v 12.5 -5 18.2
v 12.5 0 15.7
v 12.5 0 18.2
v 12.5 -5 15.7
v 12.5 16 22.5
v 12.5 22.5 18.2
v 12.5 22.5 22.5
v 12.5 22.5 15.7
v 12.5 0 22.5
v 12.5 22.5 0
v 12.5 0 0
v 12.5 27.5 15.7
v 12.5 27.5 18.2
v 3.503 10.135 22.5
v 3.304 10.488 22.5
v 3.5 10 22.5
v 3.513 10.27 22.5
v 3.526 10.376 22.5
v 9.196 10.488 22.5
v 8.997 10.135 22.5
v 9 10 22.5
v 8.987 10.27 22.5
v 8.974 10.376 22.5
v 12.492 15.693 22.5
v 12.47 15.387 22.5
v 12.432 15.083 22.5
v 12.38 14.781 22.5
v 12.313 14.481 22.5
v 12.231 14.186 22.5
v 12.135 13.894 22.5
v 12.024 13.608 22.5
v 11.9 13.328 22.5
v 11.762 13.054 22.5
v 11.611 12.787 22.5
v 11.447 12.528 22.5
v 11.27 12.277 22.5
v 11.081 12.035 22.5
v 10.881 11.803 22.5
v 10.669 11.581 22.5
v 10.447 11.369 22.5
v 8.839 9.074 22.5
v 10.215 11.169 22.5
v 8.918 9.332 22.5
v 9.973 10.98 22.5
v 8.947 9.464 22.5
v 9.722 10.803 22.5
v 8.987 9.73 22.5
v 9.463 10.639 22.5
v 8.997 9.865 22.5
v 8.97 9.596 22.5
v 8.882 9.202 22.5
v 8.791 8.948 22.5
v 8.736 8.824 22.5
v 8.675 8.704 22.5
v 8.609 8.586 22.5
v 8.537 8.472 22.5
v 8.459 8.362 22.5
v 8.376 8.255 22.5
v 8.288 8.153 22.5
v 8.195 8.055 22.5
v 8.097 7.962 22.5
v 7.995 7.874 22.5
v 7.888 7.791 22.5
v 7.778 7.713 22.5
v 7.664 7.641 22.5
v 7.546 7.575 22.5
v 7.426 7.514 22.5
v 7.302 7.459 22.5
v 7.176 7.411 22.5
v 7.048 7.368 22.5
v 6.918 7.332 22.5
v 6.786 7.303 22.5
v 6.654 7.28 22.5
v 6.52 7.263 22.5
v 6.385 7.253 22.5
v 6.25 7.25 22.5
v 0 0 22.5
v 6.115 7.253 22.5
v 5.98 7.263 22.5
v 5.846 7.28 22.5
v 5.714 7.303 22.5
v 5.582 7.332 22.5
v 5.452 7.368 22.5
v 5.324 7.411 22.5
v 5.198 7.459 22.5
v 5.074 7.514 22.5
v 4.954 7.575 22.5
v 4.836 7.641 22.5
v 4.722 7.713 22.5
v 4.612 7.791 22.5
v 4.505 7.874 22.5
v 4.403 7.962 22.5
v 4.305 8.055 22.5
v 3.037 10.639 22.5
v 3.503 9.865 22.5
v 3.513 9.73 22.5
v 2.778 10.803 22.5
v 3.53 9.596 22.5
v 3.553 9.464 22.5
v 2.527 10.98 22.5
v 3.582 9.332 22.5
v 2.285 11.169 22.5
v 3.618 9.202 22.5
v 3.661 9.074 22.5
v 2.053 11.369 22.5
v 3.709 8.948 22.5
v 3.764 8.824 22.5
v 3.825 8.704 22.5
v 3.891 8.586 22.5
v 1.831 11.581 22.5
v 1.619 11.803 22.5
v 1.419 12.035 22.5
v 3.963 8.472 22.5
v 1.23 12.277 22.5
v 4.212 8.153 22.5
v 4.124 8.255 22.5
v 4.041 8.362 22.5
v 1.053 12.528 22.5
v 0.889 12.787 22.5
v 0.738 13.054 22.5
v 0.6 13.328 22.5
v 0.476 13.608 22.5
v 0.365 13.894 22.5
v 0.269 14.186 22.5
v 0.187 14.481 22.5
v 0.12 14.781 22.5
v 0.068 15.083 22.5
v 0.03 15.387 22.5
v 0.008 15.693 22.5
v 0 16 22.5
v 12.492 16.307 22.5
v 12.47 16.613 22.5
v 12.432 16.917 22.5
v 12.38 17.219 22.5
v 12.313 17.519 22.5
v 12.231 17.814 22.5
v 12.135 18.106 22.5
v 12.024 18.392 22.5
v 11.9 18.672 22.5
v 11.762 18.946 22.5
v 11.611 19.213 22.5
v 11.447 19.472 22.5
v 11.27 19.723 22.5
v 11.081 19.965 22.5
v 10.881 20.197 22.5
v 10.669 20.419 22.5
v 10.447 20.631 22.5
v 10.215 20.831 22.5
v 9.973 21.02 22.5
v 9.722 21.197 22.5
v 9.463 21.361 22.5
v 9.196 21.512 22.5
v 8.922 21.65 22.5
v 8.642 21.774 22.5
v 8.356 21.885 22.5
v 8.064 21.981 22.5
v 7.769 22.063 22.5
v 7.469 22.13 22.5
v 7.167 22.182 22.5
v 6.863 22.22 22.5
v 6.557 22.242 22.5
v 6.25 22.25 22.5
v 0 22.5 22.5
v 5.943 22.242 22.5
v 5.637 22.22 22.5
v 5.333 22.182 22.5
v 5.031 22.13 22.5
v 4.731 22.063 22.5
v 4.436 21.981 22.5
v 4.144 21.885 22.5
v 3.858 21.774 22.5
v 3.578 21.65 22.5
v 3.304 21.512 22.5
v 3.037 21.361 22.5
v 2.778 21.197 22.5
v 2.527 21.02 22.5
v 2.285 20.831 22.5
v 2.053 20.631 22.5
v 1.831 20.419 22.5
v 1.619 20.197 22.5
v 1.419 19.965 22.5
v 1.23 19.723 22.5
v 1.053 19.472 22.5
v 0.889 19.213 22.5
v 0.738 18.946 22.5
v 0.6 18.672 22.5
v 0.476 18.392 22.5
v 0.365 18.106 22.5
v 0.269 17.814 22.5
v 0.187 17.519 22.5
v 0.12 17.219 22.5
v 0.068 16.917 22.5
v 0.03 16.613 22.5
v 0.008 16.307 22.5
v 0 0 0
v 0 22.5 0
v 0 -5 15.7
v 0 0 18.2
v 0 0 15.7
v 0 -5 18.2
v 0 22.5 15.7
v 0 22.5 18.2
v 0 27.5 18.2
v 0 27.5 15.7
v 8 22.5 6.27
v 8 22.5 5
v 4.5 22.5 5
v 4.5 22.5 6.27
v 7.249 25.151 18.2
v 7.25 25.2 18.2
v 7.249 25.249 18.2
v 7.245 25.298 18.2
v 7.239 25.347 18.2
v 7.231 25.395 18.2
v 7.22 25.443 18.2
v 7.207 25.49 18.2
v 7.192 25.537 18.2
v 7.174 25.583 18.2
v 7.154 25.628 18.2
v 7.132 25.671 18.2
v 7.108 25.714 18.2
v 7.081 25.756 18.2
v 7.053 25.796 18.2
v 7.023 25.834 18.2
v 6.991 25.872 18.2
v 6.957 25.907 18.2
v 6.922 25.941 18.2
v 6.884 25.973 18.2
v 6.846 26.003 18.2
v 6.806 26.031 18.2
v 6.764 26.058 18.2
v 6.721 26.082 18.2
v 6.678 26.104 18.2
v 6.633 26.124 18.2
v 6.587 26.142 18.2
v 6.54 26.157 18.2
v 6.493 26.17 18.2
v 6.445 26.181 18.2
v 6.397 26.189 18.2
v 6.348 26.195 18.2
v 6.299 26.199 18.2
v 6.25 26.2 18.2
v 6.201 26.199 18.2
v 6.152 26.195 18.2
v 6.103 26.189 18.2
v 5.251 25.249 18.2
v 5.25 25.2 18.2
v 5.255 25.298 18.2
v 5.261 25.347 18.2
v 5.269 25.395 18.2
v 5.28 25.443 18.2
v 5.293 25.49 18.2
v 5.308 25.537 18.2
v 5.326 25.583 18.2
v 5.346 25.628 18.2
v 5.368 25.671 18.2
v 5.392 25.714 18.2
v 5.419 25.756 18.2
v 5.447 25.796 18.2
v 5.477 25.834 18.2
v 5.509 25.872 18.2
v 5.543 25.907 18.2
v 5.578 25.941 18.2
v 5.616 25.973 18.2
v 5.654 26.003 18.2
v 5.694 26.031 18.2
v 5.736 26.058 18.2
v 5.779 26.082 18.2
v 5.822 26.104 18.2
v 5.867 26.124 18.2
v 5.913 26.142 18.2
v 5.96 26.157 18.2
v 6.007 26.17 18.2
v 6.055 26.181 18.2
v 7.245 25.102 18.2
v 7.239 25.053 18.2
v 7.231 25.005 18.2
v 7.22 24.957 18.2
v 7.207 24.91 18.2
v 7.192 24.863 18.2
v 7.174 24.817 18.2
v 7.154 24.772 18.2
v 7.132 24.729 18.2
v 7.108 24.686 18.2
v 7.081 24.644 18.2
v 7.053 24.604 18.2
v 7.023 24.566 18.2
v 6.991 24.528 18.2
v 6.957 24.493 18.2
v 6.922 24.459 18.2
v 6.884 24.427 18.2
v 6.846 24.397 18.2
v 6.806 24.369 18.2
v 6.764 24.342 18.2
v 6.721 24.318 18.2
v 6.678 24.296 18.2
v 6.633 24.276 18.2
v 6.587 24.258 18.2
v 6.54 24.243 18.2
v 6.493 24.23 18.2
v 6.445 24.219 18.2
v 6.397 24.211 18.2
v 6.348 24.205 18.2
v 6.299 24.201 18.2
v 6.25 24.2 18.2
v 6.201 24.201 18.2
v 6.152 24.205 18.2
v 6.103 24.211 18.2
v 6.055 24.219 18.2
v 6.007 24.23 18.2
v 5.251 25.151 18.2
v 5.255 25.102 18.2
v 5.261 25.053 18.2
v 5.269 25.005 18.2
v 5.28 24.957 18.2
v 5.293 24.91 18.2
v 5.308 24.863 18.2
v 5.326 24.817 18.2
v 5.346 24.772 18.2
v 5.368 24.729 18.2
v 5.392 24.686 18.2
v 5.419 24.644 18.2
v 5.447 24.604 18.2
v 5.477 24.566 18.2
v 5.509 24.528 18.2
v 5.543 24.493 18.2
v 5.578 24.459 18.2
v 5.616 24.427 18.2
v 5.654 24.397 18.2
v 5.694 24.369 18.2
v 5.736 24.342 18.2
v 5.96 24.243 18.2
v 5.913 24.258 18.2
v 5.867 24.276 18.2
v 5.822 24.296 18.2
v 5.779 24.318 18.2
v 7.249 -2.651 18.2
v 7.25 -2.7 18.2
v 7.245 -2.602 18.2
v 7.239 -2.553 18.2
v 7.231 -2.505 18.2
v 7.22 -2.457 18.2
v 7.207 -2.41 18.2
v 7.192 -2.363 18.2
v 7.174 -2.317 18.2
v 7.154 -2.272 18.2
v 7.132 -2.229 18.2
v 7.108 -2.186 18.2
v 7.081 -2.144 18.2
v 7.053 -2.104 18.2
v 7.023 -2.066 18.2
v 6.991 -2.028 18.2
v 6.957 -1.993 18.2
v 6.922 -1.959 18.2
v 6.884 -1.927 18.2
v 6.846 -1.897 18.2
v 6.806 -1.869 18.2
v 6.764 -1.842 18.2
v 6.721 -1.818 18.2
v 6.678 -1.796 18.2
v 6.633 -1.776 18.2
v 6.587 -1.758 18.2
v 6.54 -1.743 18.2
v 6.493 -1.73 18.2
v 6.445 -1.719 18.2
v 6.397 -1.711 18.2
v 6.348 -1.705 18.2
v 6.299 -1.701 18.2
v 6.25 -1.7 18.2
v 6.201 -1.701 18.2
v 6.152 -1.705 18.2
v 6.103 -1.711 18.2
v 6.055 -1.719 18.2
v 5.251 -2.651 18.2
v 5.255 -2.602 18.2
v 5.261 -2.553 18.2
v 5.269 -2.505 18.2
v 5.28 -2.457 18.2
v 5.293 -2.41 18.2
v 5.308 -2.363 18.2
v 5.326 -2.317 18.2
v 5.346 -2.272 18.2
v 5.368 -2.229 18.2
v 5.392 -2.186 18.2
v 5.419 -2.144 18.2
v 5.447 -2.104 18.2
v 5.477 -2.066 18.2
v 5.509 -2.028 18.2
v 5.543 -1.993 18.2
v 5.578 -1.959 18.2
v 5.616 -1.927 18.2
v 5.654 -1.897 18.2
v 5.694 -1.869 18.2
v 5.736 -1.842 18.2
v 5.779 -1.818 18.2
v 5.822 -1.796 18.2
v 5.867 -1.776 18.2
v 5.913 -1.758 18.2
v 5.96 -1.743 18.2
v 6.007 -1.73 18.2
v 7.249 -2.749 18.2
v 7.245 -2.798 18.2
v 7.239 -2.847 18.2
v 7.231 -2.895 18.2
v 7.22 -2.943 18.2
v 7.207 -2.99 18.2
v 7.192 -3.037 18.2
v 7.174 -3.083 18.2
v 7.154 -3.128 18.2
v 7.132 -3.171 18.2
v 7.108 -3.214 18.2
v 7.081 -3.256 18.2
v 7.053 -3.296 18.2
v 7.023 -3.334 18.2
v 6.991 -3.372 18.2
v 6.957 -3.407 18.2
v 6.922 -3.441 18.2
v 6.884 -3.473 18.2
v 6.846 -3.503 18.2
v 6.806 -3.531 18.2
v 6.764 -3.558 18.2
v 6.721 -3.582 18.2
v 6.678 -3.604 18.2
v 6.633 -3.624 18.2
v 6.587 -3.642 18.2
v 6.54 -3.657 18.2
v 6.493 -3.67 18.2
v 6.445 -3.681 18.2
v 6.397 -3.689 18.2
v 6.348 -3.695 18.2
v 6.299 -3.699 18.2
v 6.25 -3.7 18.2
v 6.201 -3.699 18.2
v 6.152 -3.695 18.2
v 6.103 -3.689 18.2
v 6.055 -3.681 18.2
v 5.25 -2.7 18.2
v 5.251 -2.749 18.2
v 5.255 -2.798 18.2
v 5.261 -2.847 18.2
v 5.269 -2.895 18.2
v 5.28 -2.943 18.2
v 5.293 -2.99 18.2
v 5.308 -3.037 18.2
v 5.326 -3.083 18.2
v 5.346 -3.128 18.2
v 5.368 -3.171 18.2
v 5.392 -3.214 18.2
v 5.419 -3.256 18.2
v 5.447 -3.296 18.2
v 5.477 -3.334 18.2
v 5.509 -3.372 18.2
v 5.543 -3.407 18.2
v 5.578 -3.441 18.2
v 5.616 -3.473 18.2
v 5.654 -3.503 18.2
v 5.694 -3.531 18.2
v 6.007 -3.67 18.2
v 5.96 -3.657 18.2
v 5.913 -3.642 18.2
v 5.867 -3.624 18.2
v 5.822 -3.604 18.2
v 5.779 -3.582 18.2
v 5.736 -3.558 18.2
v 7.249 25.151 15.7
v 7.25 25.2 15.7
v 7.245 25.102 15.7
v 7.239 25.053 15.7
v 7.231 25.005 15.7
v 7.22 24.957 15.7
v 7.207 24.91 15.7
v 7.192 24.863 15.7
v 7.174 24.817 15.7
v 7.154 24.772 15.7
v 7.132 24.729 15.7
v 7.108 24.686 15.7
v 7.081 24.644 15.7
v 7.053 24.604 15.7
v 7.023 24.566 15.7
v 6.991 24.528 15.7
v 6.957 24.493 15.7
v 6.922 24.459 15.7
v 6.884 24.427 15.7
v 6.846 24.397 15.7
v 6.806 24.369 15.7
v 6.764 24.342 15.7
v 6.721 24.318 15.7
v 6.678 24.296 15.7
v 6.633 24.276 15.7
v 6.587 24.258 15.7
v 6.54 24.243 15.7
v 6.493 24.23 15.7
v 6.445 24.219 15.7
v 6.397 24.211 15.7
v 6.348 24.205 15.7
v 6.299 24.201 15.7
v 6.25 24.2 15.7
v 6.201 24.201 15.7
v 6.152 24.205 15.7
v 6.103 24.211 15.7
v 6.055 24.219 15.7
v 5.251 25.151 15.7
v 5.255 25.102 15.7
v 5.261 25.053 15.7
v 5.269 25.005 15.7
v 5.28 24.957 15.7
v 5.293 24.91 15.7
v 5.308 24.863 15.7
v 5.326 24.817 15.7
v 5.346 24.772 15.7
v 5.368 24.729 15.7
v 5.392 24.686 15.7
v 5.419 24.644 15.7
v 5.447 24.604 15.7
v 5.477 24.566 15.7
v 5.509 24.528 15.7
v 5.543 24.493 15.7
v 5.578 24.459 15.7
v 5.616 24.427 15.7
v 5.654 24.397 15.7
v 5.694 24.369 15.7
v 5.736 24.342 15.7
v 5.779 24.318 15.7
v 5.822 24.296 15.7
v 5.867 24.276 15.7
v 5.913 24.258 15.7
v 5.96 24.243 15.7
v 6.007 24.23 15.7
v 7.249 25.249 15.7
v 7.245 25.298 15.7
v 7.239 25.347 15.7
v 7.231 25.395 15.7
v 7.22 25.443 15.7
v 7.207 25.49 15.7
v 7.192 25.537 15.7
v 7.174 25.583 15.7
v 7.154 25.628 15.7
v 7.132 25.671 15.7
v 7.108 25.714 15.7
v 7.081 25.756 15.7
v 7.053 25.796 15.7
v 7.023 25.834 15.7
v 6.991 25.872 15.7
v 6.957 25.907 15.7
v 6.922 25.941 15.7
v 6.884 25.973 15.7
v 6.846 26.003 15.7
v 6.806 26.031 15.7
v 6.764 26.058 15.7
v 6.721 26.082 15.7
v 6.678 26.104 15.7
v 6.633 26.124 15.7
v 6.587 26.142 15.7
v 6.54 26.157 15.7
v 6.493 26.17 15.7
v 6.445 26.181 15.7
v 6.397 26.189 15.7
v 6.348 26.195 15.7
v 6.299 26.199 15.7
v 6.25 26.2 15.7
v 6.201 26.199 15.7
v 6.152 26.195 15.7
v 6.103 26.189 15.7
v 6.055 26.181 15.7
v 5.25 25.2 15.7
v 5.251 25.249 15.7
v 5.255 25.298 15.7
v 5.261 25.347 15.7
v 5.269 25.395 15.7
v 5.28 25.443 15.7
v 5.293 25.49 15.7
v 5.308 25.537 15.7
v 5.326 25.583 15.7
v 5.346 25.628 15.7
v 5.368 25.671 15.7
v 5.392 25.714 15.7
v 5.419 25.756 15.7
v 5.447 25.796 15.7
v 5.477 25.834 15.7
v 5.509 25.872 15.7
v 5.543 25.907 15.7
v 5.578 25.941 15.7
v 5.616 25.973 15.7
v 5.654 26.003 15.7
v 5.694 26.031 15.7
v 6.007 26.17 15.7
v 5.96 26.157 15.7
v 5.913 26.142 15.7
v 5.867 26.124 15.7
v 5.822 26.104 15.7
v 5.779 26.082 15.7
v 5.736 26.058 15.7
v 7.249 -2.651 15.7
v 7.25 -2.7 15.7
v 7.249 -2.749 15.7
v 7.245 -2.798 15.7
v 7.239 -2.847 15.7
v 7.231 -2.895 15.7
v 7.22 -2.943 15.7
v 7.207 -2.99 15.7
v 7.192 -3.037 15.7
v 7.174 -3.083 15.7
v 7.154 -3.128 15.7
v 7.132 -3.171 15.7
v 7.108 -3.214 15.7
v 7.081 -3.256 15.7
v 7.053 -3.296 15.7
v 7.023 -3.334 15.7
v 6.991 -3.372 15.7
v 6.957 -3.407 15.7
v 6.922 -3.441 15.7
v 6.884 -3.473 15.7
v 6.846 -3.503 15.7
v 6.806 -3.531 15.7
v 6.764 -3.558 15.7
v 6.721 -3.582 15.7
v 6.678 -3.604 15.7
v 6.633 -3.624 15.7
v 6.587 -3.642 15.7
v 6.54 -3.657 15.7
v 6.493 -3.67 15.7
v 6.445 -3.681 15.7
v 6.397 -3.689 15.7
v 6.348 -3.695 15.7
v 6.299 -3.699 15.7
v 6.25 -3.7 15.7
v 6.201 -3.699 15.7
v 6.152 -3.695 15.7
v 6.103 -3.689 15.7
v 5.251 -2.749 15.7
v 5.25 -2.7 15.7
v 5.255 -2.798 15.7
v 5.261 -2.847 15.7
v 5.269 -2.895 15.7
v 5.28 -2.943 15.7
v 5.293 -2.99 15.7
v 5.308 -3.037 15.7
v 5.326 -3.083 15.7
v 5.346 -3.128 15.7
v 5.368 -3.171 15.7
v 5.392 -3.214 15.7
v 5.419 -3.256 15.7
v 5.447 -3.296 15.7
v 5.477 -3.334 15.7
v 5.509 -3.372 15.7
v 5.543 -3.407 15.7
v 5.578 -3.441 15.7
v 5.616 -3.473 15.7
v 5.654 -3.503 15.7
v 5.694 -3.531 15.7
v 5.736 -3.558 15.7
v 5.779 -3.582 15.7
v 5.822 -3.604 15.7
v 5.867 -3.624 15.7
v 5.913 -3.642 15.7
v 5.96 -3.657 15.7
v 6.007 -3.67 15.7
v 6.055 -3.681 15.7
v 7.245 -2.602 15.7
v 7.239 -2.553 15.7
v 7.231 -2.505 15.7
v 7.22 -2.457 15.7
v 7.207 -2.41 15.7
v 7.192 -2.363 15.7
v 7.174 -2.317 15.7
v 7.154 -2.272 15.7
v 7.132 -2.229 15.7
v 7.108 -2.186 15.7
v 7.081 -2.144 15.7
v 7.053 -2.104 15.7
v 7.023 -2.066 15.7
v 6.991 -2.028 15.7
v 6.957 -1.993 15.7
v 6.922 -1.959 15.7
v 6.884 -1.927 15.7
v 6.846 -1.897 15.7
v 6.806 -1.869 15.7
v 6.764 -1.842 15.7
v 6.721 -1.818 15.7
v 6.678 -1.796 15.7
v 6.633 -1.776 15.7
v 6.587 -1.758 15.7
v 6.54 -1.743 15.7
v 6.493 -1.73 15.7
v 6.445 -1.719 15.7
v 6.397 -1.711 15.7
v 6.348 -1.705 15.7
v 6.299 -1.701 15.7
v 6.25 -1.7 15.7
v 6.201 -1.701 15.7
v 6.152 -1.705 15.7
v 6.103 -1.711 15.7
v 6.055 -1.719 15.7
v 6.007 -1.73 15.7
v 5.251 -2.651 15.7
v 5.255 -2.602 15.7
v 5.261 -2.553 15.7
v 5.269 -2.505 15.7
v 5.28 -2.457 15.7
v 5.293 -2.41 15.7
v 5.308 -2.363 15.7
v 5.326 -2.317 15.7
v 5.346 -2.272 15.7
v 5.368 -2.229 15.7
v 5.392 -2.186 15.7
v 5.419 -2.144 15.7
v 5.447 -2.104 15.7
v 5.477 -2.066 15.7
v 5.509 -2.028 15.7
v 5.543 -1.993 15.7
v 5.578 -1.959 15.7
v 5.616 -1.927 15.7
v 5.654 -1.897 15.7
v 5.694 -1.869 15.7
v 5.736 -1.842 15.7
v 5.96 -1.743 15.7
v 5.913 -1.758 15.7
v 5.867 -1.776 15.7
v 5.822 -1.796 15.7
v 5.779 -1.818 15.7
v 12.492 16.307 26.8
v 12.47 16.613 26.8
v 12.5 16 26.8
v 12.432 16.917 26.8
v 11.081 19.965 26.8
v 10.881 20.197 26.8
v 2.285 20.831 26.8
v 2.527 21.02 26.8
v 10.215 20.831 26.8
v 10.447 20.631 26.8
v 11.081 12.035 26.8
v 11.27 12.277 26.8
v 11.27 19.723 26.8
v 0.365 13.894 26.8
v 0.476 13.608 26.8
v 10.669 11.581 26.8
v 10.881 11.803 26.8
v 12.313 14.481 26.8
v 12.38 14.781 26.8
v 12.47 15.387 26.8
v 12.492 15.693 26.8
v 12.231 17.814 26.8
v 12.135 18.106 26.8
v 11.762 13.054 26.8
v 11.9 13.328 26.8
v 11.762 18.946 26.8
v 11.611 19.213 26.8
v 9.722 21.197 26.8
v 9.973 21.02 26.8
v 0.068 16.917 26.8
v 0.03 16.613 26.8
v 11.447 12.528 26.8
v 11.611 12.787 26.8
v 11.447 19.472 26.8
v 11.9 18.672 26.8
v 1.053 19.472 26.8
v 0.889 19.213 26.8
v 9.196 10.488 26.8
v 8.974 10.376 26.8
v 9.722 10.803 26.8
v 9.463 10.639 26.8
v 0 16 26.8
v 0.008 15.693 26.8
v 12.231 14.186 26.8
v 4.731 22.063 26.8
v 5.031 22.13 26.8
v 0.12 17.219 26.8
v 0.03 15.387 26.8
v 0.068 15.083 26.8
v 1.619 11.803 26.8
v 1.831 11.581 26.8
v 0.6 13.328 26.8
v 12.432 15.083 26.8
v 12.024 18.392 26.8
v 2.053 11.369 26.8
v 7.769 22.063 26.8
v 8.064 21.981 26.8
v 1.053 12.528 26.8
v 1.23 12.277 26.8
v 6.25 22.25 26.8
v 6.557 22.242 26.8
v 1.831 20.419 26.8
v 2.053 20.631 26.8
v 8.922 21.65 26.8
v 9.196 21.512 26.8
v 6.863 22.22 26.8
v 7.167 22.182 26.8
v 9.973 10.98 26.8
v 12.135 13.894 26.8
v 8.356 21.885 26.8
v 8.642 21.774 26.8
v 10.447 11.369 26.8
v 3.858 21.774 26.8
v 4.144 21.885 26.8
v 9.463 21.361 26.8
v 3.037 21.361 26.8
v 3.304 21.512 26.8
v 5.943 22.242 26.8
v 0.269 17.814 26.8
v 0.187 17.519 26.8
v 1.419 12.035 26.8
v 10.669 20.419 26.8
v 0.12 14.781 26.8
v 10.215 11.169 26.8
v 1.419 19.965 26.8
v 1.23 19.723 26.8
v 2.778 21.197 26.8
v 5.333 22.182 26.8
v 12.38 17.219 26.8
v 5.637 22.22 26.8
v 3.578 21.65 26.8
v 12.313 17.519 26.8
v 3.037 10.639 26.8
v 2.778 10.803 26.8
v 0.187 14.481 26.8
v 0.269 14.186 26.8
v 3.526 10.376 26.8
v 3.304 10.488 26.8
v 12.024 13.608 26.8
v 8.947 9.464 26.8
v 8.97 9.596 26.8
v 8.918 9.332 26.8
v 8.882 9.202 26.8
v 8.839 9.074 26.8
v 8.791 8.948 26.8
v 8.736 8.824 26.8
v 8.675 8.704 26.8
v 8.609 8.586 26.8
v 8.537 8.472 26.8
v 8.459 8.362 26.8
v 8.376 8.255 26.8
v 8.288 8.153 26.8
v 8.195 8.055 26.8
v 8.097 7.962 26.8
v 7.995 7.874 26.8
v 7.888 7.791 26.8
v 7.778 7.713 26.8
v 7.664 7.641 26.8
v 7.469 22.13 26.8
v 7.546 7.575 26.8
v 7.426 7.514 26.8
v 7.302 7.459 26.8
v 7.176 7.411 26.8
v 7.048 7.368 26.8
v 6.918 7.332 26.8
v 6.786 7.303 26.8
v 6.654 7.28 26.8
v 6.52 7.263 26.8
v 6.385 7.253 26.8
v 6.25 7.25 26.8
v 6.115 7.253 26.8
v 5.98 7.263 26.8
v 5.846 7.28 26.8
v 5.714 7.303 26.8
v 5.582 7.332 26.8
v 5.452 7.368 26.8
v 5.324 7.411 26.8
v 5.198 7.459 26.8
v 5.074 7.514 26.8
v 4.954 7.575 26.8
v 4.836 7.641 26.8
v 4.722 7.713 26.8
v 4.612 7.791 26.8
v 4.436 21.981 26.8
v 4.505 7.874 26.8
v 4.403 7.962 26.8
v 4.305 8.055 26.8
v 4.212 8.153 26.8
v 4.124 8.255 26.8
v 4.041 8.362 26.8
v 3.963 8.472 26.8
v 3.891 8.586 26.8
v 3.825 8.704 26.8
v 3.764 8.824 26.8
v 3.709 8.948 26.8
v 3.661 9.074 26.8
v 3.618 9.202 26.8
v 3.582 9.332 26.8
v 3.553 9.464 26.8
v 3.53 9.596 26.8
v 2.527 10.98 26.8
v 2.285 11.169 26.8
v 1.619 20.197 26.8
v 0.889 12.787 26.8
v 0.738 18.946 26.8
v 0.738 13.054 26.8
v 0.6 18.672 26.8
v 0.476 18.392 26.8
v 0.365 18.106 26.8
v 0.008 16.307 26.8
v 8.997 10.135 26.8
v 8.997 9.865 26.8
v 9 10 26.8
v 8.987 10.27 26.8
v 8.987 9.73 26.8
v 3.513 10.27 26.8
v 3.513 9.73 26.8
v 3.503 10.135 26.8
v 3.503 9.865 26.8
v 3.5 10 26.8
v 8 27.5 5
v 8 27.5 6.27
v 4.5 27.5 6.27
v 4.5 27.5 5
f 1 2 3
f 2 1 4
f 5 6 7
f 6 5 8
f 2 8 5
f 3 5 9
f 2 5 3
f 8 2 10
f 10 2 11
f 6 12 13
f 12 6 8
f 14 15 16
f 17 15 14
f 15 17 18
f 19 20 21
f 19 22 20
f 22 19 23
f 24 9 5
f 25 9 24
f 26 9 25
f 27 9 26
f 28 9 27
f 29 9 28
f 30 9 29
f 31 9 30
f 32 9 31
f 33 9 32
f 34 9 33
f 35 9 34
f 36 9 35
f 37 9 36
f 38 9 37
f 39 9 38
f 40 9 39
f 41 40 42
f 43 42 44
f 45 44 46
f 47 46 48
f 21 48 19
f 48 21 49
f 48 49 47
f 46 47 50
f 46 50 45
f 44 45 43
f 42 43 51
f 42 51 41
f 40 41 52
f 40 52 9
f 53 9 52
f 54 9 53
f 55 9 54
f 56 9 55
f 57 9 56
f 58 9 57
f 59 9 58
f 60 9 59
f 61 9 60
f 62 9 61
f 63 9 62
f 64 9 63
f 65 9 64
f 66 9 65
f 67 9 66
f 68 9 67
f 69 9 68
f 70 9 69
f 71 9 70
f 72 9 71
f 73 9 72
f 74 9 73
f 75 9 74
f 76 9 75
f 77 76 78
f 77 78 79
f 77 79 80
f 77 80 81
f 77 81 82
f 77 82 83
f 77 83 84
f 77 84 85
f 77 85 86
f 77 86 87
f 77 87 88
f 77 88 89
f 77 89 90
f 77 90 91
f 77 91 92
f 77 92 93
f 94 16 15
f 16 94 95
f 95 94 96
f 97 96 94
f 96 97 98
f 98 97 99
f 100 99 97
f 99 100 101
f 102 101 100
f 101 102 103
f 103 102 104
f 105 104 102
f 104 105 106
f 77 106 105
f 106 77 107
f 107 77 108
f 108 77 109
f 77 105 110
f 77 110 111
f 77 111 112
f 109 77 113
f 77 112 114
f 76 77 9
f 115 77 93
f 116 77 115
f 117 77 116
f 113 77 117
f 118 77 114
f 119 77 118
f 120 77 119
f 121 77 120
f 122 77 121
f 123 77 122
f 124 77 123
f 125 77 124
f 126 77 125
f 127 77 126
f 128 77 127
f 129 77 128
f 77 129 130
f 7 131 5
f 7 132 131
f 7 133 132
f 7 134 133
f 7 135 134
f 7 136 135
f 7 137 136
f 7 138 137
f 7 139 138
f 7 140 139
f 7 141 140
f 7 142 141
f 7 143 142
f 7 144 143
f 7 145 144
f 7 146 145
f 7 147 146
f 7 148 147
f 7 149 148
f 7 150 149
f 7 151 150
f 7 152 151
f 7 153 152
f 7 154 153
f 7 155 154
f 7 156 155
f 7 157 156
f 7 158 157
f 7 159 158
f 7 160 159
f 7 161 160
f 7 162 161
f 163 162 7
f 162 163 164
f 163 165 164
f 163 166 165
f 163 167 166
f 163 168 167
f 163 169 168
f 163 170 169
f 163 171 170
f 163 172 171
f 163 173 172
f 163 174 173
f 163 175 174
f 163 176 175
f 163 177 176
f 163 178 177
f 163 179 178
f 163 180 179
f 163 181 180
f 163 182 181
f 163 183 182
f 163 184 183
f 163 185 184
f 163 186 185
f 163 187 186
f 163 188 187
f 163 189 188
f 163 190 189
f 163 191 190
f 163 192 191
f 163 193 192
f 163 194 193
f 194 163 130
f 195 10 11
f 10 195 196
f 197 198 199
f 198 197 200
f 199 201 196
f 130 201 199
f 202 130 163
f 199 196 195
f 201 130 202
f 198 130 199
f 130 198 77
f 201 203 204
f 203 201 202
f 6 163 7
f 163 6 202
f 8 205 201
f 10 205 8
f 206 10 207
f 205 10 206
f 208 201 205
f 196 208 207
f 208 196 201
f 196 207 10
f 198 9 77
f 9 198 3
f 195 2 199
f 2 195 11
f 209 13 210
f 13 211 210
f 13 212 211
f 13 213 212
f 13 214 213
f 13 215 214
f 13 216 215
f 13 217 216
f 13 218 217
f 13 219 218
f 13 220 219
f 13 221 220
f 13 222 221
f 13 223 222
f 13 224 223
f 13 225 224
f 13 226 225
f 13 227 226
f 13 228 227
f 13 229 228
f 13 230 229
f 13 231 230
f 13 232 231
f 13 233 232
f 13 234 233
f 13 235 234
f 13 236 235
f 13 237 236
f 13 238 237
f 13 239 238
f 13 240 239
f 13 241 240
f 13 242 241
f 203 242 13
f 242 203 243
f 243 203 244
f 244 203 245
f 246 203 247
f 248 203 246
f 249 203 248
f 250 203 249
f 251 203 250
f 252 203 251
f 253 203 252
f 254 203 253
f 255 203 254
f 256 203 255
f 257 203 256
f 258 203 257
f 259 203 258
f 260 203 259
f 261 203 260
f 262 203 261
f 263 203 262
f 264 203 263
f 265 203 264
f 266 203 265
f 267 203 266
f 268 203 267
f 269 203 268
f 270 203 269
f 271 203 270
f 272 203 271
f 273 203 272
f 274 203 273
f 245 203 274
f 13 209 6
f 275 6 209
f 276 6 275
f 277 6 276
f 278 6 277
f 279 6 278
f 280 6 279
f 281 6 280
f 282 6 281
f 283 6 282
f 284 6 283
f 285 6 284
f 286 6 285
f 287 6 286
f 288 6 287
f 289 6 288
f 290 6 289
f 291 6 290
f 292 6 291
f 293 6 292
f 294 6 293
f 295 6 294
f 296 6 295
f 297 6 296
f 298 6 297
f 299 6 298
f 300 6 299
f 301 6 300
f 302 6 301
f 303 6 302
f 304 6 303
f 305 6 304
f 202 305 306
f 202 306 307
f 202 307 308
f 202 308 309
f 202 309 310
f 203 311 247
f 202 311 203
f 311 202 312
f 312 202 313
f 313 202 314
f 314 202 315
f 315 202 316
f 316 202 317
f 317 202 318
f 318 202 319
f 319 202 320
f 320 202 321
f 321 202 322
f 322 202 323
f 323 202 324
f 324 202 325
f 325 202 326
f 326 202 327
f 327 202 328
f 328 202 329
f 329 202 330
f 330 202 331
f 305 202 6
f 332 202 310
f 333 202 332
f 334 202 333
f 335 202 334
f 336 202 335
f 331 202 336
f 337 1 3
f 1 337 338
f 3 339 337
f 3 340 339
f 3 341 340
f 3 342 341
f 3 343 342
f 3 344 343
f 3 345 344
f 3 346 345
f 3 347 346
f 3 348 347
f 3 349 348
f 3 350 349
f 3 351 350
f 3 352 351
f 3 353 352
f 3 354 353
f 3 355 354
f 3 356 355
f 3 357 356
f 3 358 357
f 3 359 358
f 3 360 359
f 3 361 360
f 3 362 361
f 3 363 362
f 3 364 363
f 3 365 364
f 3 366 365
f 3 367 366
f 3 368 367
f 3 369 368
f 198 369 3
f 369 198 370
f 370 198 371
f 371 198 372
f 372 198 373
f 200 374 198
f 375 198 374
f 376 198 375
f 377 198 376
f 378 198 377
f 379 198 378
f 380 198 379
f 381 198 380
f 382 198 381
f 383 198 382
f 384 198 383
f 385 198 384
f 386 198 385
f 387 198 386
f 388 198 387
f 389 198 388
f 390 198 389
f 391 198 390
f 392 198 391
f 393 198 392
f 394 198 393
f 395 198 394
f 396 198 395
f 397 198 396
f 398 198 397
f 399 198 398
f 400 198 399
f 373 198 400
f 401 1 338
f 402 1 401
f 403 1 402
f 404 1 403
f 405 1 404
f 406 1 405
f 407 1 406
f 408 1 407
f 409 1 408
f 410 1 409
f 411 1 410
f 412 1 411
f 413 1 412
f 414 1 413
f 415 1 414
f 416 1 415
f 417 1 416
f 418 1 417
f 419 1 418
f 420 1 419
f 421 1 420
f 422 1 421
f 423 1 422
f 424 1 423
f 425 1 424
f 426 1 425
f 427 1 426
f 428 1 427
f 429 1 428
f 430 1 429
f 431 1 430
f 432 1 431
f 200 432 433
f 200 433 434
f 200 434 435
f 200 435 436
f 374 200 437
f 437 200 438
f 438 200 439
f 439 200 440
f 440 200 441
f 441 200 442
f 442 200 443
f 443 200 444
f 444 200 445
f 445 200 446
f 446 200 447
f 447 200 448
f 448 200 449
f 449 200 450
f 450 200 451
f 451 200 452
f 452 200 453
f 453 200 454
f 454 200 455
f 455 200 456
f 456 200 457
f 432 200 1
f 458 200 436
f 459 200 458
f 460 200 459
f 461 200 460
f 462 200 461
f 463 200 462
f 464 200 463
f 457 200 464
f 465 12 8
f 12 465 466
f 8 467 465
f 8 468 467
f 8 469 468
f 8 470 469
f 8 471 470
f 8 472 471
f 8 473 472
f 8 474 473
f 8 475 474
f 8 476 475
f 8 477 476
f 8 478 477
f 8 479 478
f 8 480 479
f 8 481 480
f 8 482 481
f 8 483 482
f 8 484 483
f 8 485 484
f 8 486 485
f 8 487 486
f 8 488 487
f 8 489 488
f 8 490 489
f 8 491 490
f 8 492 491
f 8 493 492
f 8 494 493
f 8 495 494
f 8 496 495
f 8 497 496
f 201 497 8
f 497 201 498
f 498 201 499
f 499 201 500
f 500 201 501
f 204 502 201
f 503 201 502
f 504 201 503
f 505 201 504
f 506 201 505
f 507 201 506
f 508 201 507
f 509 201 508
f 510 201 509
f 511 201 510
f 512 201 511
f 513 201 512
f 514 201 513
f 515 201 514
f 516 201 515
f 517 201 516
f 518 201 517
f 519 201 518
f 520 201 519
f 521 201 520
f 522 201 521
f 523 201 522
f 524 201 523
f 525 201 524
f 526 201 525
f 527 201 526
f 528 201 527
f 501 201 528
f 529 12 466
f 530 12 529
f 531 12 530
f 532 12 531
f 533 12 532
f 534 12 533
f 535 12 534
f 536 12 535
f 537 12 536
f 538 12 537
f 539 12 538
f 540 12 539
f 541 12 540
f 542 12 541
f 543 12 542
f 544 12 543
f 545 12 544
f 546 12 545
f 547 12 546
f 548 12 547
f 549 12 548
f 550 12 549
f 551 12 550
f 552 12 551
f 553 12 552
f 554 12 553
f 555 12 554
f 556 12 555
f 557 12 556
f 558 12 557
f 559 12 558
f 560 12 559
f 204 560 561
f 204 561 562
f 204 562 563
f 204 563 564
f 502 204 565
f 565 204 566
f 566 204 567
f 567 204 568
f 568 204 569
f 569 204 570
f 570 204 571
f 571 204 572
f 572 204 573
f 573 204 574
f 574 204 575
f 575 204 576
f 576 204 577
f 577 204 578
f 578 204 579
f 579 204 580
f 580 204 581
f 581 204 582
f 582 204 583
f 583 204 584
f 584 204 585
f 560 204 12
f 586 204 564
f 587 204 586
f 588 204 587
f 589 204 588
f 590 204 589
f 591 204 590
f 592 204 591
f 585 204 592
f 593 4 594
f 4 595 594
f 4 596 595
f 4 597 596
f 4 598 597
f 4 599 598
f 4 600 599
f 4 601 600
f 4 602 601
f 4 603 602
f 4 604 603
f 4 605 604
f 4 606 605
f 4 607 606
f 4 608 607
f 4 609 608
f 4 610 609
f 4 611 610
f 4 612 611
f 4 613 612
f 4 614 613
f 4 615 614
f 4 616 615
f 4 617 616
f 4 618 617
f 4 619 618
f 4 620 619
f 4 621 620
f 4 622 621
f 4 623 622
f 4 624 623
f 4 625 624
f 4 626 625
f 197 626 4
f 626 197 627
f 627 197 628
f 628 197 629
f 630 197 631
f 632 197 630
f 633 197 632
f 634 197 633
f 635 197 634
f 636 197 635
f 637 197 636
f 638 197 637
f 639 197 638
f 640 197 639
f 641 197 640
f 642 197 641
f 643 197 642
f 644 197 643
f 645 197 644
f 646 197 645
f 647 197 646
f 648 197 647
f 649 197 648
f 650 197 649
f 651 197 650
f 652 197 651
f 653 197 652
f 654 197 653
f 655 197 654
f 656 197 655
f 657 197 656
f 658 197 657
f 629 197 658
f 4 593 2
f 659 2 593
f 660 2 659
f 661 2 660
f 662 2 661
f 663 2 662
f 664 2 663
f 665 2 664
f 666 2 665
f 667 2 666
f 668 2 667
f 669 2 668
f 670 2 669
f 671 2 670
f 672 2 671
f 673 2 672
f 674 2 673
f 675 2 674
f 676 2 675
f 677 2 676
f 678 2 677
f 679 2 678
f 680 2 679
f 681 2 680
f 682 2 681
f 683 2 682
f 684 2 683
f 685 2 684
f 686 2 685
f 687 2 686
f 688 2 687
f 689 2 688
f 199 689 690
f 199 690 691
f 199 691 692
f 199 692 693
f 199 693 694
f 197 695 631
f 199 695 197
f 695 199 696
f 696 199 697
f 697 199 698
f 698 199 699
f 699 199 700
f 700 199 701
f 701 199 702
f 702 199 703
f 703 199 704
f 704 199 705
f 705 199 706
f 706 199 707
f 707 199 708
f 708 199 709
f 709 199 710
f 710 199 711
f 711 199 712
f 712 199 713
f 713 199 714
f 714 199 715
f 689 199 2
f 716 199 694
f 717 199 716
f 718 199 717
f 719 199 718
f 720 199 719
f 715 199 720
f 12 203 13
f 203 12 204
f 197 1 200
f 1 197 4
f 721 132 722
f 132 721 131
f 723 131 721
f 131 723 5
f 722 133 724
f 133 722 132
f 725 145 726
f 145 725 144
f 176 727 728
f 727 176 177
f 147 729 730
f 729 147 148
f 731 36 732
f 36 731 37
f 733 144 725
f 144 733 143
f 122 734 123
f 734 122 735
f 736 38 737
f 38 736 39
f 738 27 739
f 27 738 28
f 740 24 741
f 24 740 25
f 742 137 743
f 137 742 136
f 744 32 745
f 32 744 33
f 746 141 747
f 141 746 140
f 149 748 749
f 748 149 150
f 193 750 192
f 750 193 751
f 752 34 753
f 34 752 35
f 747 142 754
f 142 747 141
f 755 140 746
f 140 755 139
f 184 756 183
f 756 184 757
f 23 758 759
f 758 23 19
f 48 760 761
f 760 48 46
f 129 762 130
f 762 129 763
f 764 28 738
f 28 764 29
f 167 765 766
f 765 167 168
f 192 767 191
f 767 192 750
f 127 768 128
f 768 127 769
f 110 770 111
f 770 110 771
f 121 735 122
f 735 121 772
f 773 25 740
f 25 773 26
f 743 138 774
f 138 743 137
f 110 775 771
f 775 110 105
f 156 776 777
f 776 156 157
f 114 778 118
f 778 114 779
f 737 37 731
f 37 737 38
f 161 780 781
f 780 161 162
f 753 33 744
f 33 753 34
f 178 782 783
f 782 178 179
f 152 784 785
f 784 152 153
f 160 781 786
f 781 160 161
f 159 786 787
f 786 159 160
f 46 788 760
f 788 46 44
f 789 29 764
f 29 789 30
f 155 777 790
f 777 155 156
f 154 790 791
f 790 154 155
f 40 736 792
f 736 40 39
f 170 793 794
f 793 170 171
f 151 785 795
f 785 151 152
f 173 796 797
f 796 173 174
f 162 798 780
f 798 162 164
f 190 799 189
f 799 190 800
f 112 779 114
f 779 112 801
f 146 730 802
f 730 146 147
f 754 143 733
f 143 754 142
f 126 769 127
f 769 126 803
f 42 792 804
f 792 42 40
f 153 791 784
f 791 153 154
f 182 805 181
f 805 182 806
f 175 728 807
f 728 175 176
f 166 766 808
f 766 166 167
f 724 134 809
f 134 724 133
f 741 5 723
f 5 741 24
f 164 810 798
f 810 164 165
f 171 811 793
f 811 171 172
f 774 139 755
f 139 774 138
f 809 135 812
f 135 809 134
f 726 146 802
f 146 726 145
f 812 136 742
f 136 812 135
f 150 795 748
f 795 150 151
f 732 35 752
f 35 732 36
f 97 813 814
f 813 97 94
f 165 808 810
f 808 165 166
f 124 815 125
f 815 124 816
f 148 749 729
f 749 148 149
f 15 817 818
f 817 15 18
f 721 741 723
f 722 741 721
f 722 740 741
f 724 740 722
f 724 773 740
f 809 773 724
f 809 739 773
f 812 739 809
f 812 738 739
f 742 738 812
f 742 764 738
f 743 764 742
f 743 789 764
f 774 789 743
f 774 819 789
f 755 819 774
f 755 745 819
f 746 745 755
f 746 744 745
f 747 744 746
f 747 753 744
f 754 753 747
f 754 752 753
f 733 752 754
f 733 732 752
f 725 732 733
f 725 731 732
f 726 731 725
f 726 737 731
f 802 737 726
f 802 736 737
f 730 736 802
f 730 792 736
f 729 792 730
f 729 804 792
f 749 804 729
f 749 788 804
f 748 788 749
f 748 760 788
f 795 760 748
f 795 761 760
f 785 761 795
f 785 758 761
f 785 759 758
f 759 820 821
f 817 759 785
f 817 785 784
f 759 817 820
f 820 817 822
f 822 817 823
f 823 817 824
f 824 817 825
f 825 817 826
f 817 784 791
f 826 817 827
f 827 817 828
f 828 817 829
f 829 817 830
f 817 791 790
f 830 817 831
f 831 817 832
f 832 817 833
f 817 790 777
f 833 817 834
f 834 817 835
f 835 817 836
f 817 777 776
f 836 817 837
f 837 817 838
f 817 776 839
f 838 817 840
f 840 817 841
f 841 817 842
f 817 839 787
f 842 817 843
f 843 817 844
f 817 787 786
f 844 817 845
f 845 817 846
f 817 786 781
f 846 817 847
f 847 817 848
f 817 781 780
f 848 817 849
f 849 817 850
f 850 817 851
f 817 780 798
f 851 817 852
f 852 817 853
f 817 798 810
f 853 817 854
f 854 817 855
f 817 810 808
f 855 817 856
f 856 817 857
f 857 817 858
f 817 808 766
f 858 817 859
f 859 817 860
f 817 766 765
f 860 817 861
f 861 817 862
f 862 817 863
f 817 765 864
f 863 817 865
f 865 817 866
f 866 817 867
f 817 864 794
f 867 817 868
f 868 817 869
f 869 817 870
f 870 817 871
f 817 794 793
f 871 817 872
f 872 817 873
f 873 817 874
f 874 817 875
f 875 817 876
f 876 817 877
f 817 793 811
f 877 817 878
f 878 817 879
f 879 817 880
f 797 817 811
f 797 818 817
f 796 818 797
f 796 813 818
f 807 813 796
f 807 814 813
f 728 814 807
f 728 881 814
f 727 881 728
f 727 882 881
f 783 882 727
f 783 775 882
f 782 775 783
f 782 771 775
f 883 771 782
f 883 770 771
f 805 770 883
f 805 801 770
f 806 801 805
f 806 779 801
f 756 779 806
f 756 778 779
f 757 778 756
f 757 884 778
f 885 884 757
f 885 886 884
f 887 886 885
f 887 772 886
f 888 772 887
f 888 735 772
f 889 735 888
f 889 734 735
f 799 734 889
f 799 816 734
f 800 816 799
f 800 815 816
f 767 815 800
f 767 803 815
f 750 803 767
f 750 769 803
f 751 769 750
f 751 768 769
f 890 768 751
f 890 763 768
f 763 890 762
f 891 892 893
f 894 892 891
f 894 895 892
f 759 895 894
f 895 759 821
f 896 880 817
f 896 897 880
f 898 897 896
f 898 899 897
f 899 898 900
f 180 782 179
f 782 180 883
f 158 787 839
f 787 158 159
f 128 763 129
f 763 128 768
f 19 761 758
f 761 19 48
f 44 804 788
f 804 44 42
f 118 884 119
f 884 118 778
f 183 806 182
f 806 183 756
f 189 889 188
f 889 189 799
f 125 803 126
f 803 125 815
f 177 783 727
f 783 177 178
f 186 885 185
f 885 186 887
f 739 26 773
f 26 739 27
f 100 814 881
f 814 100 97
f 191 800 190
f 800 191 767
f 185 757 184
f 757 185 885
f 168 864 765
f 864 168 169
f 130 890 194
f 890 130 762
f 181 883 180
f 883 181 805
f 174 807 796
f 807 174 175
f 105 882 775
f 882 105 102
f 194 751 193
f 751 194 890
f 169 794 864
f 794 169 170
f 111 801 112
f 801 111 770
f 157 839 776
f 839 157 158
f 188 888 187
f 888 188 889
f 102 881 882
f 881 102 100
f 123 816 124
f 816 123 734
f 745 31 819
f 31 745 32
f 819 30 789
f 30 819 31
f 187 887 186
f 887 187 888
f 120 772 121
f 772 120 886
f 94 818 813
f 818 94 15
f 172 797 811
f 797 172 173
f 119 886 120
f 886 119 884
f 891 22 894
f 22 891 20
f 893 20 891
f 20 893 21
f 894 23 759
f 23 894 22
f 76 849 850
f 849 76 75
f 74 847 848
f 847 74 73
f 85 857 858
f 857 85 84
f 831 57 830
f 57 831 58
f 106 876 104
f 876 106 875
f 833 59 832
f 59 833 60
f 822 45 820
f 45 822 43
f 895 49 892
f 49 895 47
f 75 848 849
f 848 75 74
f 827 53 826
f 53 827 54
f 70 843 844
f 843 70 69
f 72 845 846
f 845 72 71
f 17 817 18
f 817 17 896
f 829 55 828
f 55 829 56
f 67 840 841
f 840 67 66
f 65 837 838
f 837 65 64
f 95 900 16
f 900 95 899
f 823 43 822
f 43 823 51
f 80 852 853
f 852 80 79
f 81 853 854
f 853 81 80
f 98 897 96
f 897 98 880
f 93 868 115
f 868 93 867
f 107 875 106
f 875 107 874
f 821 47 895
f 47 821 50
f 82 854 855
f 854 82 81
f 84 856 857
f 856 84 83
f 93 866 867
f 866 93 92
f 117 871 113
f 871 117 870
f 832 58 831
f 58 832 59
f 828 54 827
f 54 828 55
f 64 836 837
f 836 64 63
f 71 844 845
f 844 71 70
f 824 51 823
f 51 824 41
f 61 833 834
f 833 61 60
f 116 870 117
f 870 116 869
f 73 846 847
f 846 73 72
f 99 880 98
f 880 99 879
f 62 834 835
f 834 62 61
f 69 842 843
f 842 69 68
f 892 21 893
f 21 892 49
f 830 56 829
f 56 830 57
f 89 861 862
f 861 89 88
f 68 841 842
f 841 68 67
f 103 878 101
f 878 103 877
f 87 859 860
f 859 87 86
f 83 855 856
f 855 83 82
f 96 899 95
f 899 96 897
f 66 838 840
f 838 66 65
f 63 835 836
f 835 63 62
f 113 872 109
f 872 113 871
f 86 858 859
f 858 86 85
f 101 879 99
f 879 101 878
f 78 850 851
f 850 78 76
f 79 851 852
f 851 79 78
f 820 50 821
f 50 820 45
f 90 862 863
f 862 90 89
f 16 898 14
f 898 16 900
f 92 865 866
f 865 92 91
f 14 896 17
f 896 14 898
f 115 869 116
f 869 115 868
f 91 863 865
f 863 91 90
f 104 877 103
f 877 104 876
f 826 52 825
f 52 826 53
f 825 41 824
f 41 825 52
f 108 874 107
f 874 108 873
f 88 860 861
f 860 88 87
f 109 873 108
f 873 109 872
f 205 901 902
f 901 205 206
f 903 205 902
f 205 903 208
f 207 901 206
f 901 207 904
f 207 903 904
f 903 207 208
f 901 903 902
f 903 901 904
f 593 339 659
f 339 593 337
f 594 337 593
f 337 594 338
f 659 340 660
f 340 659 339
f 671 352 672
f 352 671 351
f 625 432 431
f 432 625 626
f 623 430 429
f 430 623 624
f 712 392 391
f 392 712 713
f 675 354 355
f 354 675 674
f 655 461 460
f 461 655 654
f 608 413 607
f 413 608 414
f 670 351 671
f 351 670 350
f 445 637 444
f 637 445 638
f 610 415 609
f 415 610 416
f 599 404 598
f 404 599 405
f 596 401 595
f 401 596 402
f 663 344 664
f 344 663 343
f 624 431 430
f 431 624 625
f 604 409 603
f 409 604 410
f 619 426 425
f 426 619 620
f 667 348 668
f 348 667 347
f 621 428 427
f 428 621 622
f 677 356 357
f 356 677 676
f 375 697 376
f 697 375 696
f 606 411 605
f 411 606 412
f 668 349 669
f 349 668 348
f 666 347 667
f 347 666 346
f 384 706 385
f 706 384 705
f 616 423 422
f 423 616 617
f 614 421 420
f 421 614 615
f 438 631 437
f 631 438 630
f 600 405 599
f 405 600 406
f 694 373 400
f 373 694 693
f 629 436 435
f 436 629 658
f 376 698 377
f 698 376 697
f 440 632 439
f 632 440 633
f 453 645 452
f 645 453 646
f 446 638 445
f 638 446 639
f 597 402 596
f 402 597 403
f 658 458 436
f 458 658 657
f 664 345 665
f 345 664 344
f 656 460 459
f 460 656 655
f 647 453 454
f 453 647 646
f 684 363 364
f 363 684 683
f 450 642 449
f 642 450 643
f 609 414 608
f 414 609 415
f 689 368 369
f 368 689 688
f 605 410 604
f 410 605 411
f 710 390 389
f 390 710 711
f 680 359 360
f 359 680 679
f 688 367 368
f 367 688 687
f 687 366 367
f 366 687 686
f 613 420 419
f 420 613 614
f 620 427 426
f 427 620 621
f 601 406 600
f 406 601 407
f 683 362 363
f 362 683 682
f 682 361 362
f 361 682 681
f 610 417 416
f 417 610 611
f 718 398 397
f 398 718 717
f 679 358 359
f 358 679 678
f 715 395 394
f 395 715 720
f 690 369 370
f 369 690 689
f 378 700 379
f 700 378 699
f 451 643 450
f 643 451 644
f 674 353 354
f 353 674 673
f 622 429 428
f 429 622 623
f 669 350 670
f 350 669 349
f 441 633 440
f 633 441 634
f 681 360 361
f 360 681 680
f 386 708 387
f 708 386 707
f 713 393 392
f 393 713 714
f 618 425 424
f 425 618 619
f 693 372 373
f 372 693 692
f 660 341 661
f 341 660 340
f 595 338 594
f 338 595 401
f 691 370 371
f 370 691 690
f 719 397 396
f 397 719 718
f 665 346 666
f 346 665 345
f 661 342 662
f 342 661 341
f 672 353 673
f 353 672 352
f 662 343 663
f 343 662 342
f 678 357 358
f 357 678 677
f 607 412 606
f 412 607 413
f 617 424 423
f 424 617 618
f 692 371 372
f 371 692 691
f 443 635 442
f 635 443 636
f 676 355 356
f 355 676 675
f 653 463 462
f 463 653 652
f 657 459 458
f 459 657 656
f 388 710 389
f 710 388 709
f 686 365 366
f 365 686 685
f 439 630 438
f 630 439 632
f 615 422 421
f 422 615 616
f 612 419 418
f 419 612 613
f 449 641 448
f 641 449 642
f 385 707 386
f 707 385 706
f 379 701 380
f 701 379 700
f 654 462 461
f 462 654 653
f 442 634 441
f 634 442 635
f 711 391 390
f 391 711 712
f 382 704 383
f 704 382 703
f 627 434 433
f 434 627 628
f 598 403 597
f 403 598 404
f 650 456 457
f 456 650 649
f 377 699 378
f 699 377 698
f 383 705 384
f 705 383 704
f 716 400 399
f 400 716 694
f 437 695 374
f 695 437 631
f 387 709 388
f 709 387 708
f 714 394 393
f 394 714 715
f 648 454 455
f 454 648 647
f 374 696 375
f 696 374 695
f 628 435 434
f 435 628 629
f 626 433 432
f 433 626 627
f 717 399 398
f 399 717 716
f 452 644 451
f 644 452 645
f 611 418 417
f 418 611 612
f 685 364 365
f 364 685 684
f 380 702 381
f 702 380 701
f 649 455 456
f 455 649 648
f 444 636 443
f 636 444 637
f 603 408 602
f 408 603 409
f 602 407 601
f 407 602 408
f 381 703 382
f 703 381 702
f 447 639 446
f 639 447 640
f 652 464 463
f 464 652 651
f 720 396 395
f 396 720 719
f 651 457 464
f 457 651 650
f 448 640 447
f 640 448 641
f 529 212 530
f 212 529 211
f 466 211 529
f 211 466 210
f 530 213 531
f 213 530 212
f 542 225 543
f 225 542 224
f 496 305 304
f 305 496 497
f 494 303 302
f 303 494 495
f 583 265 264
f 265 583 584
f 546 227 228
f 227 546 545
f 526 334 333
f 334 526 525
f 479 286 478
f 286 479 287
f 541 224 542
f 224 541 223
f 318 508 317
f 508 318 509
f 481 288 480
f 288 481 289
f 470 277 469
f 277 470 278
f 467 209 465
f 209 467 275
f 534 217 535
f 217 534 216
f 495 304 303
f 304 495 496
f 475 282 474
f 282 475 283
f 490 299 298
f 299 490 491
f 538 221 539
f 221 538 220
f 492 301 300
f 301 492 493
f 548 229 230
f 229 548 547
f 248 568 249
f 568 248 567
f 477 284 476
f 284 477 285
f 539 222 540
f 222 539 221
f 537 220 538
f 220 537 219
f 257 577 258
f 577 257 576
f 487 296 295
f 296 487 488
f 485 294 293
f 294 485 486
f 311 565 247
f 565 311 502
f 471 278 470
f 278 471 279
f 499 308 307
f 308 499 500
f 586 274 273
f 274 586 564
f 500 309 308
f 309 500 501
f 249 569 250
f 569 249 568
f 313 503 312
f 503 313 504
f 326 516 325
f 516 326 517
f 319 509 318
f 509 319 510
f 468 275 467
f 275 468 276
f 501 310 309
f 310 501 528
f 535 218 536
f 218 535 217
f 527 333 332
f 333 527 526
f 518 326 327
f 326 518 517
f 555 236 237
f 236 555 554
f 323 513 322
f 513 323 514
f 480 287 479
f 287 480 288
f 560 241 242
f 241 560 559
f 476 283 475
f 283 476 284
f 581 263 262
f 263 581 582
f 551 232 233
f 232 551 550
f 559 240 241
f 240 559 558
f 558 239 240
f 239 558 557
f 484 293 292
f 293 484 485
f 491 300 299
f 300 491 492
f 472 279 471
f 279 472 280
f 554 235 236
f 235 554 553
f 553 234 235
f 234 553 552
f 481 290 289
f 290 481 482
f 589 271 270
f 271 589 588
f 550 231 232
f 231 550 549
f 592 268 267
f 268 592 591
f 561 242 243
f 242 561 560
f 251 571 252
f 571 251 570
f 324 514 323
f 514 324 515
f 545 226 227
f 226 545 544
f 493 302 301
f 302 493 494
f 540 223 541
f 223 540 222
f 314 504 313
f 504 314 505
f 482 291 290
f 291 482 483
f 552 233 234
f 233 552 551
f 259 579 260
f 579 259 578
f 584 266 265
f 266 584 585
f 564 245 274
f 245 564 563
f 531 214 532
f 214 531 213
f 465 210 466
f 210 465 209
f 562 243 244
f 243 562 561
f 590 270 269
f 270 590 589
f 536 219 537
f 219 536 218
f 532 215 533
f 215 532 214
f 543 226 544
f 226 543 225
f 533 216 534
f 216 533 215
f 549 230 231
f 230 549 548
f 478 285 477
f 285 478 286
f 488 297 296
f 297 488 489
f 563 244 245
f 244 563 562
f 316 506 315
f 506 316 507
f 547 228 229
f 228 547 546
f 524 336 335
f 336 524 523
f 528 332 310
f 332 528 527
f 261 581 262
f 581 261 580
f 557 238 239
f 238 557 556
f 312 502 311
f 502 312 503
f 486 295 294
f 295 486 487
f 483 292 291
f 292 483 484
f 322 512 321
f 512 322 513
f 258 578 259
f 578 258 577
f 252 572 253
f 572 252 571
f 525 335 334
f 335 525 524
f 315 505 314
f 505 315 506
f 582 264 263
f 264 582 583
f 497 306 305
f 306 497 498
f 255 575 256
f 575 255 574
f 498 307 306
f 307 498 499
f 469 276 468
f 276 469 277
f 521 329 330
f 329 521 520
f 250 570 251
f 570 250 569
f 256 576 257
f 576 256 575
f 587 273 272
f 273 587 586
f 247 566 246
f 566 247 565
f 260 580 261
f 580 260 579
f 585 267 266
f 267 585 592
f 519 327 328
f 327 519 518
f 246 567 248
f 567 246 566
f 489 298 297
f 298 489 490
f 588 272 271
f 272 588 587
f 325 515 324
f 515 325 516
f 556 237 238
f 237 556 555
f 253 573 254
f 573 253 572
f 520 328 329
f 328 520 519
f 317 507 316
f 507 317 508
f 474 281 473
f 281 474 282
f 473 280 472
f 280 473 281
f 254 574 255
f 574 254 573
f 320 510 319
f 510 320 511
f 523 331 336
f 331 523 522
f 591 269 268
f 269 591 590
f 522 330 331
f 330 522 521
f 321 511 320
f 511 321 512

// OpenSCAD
// file: shortcuts.scad
//include </u/a/3dprint/alanlib/shortcuts.scad>;
//include <shortcuts.scad>  <- only works if run from terminal
module R(v) {rotate(v) children();}
module T(v) {translate(v) children();}
module S(v) {scale(v) children();}
module Rx(a=90) {rotate([a, 0, 0]) children();}
module Ry(a=90) {rotate([0, a, 0]) children();}
module Rz(a=90) {rotate([0, 0, a]) children();}
module Tx(d) {translate([d, 0, 0]) children();}
module Ty(d) {translate([0, d, 0]) children();}
module Tz(d) {translate([0, 0, d]) children();}
module Sx(s) {scale([s, 1, 1]) children();}
module Sy(s) {scale([1, s, 1]) children();}
module Sz(s) {scale([1, 1, s]) children();}

// TODO: rename this to utils.scad
// TODO: create shapes.scad, move stuff there

mm_per_in = 25.4;
eps = .001;
phi = (sqrt(5)+1)/2; // useful for regular solids
O = 0; // silly sugar for hiding syntax highlighting

module brim_scale(s = [0.9, 1.1], height=.3) {
    // to be used for objects with multiply-connected footprints - 
    // the minkowski method doesn't work well for that case
    //
    // designed to work for objects that :
    // - rest on the x-y plane
    // - are somewhat centered on the origin
    union() {
        children();
        linear_extrude(height=height)
        difference() {
            scale([s[1], s[1], s[0]]) hull() projection(cut=true) children();
            scale([s[0], s[0], s[1]]) hull() projection(cut=true) children();
        }
    }
}

module dremel_footprint() {
    difference() {
        cube([232, 152, 1], center=true);
        cube([230, 150, 2], center=true);
    }
}

module brim_minkowski(radius=10, height=.3) {
    // i think this produces the "right" result for objects with simply-connected footprints.
    // nonconvex objects with narrow crevices might not do well.
    //
    // designed to work for objects that:
    // - rest on the x-y plane (?)
    // - have simply-connected footprints
    union() {
        minkowski() {
            linear_extrude(height=eps)
                projection(cut=true)
                    children();
            cylinder(r=radius, h=height-eps);
        }
        children();
    }
}

module trapezoid_arbitrary_3d(base_width, top_width, height, offs, thickness) {
    // assumes base_width > top_width
    linear_extrude(height=thickness) {
        polygon([[0, 0], 
                 [offs, height], 
                 [offs+top_width, height], 
                 [base_width, 0]]);
    }
}

module trapezoid_3d(base_width, top_width, height, thickness) {
    trapezoid_arbitrary_3d(base_width, top_width, height, (base_width-top_width)/2, thickness);
}

module pill3(r=1, l=1) {
    union() {
        cylinder(r=r, h=l, $fn=64);
        sphere(r=r, $fn=64);
        translate([0, 0, l]) sphere(r=r, $fn=64);
    }
}

module pill2(r=1, l=2, h=.5) {
    linear_extrude(height=h) {
        translate([-r, 0, 0]) square([r*2, l]);
        circle(r, $fn=64);
        translate([0, l, 0]) circle(r, $fn=64);
    }
}

module pill2D(r=1, l=2) {
    translate([-r, 0, 0]) square([r*2, l]);
    circle(r, $fn=64);
    translate([0, l, 0]) circle(r, $fn=64);
}

module rounded_square(dim=[3, 3], r=1, h=1, $fn=64) {
    linear_extrude(height=h) {
        union() {
            translate([-r, 0]) square(dim + [2*r, 0]); 
            translate([0, -r]) square(dim + [0, 2*r]);
            translate([0, 0]) circle(r, $fn);
            translate([0, dim[1]]) circle(r, $fn);
            translate([dim[0], 0]) circle(r, $fn);
            translate([dim[0], dim[1]]) circle(r, $fn);
        }
    }
}

module rounded_cube(dim=[3, 3, 3], r=1, $fn=64) {
    union() {
        // cubes
        translate([-r, 0, 0]) cube(dim + [2*r, 0, 0]);
        translate([0, -r, 0]) cube(dim + [0, 2*r, 0]);
        translate([0, 0, -r]) cube(dim + [0, 0, 2*r]);
        // spheres
        translate([0, 0, 0]) sphere(r, $fn);
        translate([dim[0], 0, 0]) sphere(r, $fn);
        translate([0, dim[1], 0]) sphere(r, $fn);
        translate([dim[0], dim[1], 0]) sphere(r, $fn);
        translate([0, 0, dim[2]]) sphere(r, $fn);
        translate([dim[0], 0, dim[2]]) sphere(r, $fn);
        translate([0, dim[1], dim[2]]) sphere(r, $fn);
        translate([dim[0], dim[1], dim[2]]) sphere(r, $fn);
        // cylinders
        translate([0, 0, 0]) cylinder(r=r, h=dim[0], $fn);
    }
}



module test_object() {
    union() {
        cube([30, 10, 10]);
        cube([10, 30, 10]);
    }
}    

//test_object();
//brim_minkowski() test_object();
//brim_scale() test_object();
//brim_scale() {test_object();}


// material/process constants
// thickness = 2 -> notch width = 2.4
ACRYLIC_60mil = 1.5;
LASER_KERF_ACRYLIC_60mil = .3; 
// this is an adjustment to the material width which accounts for
// the small amount of material lost in the cut.
// not sure yet whether this depends on the material/thickness.
// i suspect that it might depend on the laser power/speed,
// which is determined by the material/thickness


module laser_fiducial() {
    polygon([[0, 0], [0, 1], [1, 0]]);    
}



































// workaround for buggy line counts in error messages
echo("200 lines in shortcuts.scad");
// main file
$fn = 128;

// these are all guesses
W = 12.5;   // .49" at widest, .47" at narrowest (which .22" above bottom)
L = 22.5;   // .88" - .89"
H = 22.5;   // .88"
servo_flange_extent = 5;  // (1.27" - .88")/2 = .195"
servo_main_box_dim = [W, L, H];
servo_flange_dim = [W, L+2*servo_flange_extent, 2.5];  // height = .1"
servo_flange_height = 15.7; // .62"
servo_big_cyl_rad = W/2;
servo_big_cyl_height = 4.3; // .17"
servo_big_cyl_pos = [W/2, 16, H];    // ?
servo_small_cyl_rad = 5.5/2; // diam = .22"
servo_small_cyl_height = 4.3;
servo_small_cyl_pos = [W/2, 10, H];  // ?
servo_wire_dim = [3.5, 5, 1.27];  // [.14, ..., .05]
servo_wire_pos = [W/2 - servo_wire_dim[0]/2, L, 5];  // .2" above bottom

servo_screw_hole_rad = 1; // diam = .08"
servo_screw_hole_dist = 1 + 1.7; // .07" from inside
servo_screw_hole_pos_1 = [W/2, -servo_screw_hole_dist, servo_flange_height-1];
servo_screw_hole_pos_2 = [W/2, L+servo_screw_hole_dist, servo_flange_height-1];


module servo_9g() {
    difference() {
        union() {
            cube(servo_main_box_dim);
            T([0, -servo_flange_extent, servo_flange_height]) 
              cube(servo_flange_dim);
            T(servo_big_cyl_pos) 
              cylinder(r=servo_big_cyl_rad, h=servo_big_cyl_height);
            T(servo_small_cyl_pos) 
              cylinder(r=servo_small_cyl_rad, h=servo_small_cyl_height);
            T(servo_wire_pos)
              cube(servo_wire_dim);
        }
        T(servo_screw_hole_pos_1)
          cylinder(r=servo_screw_hole_rad, h=servo_flange_dim[2]+2);
        T(servo_screw_hole_pos_2)
          cylinder(r=servo_screw_hole_rad, h=servo_flange_dim[2]+2);
    }
}

servo_9g();

include <shortcuts.scad>
